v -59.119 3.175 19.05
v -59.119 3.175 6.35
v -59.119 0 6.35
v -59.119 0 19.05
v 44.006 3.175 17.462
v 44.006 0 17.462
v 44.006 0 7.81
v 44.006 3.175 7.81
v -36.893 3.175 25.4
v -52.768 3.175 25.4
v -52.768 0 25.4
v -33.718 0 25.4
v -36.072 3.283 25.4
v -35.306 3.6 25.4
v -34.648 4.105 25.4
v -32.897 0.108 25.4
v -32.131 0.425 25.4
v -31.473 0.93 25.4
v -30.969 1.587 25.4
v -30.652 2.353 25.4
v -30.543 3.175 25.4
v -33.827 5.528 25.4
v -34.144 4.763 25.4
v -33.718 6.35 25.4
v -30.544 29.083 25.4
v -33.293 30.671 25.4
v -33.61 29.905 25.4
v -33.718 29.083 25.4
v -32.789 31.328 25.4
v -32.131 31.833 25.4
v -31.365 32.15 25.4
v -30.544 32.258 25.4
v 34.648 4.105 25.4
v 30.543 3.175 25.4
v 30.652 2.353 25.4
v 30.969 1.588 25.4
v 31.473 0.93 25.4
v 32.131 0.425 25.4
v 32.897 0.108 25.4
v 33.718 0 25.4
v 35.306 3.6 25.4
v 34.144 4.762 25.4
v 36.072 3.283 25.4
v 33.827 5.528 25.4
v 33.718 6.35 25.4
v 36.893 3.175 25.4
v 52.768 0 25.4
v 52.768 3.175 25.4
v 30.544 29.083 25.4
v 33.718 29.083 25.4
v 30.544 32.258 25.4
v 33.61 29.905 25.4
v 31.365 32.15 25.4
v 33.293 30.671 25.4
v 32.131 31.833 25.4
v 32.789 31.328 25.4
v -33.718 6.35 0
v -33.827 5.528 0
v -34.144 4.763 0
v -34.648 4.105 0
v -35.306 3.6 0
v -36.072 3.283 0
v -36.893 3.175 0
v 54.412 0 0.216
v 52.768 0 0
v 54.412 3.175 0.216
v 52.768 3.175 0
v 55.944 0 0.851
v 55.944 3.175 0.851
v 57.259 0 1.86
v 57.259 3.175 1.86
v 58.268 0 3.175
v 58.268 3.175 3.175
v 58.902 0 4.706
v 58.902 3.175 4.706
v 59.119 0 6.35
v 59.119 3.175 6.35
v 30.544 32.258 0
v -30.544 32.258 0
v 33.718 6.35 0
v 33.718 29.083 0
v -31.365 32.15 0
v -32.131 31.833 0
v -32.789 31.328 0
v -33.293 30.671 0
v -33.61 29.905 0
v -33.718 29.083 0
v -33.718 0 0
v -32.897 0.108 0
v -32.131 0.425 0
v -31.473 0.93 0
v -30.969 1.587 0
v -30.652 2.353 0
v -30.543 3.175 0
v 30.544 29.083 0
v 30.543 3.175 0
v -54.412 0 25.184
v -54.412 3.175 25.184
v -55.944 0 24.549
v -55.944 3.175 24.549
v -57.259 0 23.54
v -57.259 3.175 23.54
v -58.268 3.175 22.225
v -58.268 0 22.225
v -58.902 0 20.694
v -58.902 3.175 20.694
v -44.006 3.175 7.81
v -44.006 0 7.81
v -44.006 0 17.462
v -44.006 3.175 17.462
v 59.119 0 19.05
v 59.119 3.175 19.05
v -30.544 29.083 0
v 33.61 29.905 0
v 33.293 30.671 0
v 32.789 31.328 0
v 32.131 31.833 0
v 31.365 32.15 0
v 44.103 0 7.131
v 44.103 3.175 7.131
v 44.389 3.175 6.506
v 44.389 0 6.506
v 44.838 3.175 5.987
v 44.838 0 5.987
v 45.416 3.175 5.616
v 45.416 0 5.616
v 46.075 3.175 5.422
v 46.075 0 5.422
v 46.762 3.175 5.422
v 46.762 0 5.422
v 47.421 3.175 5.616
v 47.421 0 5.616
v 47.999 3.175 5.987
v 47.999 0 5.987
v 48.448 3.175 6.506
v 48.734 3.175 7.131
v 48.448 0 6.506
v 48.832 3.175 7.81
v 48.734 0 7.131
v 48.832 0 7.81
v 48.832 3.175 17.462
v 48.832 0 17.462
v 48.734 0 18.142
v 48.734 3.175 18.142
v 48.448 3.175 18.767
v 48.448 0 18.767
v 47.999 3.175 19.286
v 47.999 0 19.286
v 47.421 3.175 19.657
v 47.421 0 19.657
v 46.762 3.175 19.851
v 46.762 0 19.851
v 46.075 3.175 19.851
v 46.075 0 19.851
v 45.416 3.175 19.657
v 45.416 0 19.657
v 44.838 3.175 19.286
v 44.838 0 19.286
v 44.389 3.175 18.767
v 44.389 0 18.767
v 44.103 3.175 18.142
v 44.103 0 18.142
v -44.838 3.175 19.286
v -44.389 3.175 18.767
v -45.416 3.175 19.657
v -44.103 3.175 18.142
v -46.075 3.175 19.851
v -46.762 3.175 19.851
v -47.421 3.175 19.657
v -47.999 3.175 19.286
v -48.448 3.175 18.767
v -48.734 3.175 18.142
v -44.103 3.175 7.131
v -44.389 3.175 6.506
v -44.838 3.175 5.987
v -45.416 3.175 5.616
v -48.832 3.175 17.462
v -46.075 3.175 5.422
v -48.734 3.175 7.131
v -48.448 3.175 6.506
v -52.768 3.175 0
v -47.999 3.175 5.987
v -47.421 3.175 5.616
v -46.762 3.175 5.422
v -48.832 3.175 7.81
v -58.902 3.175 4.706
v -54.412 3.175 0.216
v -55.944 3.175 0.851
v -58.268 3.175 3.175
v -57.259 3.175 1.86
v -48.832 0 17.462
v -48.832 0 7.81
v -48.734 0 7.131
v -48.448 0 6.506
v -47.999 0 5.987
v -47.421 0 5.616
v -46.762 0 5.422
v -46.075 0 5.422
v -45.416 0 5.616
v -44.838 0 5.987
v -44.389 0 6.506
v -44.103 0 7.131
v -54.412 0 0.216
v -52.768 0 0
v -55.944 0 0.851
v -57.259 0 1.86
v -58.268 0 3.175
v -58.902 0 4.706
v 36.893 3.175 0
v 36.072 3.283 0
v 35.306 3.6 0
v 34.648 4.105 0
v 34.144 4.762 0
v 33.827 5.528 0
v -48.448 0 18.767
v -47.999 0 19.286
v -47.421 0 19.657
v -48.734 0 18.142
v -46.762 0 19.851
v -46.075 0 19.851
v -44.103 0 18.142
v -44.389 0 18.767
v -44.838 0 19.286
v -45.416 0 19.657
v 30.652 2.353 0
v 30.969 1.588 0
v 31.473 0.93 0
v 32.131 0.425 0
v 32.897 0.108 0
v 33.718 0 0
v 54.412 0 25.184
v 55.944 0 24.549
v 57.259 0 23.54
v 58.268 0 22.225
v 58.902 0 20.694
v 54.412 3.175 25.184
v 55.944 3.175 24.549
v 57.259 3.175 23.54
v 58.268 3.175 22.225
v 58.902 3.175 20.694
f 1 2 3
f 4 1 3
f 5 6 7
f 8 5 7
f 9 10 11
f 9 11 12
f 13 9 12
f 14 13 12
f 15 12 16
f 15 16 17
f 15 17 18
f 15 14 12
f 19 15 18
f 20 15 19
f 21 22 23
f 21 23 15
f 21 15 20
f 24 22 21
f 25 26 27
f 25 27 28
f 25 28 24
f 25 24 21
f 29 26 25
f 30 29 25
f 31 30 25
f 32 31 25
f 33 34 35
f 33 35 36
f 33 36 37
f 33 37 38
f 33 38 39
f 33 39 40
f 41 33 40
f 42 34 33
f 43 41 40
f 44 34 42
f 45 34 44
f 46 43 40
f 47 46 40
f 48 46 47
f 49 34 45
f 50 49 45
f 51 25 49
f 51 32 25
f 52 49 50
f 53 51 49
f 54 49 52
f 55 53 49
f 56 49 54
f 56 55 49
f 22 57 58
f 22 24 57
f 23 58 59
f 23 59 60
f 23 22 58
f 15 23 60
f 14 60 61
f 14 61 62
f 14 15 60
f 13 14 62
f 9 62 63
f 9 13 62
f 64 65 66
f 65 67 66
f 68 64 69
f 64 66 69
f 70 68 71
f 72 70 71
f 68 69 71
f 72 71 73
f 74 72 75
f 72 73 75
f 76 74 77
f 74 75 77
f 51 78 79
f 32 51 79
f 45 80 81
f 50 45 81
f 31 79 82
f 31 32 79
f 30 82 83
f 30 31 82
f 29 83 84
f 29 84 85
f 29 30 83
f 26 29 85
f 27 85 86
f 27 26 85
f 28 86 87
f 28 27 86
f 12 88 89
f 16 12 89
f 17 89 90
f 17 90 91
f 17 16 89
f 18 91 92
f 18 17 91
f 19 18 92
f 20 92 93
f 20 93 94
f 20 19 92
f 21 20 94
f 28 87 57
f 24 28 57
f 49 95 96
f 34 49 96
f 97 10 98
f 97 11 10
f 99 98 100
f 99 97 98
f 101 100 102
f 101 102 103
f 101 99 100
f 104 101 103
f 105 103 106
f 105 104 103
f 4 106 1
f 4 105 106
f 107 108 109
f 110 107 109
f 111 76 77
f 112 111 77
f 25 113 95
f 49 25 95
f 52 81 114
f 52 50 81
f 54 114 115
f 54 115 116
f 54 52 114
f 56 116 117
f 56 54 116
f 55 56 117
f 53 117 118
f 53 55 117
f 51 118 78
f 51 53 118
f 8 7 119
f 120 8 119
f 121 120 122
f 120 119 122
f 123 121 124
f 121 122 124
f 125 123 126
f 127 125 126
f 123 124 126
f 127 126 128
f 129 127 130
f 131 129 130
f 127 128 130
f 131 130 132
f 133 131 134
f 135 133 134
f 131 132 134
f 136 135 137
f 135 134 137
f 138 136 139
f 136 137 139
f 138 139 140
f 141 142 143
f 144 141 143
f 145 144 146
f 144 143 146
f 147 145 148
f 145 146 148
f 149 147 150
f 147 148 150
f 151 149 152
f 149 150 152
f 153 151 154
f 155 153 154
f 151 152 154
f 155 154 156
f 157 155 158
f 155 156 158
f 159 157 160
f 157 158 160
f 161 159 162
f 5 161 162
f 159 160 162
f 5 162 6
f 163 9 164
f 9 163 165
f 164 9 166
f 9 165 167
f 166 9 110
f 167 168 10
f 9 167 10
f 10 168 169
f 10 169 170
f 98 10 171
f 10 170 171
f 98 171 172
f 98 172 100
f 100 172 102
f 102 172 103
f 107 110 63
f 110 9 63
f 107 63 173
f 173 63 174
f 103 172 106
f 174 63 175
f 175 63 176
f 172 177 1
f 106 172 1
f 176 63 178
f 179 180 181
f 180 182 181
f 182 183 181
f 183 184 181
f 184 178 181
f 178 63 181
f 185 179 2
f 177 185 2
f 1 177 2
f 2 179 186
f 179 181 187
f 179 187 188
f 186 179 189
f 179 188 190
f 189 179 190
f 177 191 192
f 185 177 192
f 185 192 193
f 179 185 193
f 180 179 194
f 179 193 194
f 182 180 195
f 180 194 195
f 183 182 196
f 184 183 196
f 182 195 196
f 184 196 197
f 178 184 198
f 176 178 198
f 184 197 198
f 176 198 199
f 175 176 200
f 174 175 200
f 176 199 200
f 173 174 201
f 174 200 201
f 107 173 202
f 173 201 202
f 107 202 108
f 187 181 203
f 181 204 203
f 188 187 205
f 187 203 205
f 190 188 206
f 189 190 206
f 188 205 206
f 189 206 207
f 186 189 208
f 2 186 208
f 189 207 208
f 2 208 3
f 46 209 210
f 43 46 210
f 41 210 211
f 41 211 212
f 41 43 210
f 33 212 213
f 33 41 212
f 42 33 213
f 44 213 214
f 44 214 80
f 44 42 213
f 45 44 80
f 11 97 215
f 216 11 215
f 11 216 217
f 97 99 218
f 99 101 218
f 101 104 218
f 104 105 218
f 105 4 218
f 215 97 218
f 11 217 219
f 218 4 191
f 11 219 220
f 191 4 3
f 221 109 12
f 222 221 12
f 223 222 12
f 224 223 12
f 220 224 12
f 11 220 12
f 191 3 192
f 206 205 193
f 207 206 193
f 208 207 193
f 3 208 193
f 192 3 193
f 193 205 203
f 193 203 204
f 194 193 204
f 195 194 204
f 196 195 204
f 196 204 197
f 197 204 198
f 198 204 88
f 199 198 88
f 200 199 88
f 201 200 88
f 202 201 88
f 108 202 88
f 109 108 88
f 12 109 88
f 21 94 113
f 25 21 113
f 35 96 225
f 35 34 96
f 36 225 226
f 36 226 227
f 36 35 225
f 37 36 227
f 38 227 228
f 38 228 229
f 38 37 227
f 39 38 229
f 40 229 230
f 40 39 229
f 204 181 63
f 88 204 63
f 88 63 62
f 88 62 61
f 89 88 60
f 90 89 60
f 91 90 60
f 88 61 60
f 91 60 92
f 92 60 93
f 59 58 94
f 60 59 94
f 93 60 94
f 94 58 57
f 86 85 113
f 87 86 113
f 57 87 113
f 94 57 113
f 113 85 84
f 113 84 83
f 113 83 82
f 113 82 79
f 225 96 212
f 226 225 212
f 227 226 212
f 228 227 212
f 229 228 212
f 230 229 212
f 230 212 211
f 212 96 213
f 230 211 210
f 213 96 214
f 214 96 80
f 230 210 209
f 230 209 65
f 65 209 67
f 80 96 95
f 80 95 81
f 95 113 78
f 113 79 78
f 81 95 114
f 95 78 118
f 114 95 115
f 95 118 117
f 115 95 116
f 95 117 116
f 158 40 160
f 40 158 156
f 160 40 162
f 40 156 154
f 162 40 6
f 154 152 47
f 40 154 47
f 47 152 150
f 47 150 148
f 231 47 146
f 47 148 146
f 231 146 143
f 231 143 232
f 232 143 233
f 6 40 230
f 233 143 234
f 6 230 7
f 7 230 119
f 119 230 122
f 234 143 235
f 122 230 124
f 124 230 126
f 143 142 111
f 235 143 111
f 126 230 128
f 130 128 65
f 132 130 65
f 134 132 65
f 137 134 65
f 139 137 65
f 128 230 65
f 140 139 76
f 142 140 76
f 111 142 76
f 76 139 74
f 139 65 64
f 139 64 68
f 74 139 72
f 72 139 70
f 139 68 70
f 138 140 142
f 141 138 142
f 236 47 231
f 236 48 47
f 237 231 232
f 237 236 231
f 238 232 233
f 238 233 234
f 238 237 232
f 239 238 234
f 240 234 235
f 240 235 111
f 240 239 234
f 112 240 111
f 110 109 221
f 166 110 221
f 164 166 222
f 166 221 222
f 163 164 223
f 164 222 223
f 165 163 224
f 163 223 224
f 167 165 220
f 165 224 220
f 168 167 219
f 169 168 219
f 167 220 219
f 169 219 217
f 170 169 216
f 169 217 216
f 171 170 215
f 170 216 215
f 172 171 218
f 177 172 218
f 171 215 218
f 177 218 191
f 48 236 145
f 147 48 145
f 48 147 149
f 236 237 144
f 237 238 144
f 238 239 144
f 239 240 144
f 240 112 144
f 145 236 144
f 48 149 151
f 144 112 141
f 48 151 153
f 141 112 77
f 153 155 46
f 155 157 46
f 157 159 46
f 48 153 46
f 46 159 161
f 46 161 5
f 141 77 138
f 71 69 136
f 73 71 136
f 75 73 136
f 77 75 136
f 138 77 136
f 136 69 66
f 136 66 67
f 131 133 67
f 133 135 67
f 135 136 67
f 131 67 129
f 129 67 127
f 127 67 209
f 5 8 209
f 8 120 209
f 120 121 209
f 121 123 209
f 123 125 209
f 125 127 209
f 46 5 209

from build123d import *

# Parameters (mm, degrees)
F1_DEPTH = 25.4
F2_R     = 3.175
F4_DEPTH = 32.259
F5_R     = 6.35
F6_R     = 3.175


with BuildPart() as f1:
    # F0 (on Top) → F1 (new body)
    with BuildSketch(Plane.XY):
        Polygon((-30.5435, 29.083), (0, 29.083), (30.5435, 29.083), (30.5435, 0), (59.1185, 0), (59.1185, 3.175), (33.7185, 3.175), (33.7185, 32.258), (0, 32.258), (-33.7185, 32.258), (-33.7185, 3.175), (-59.1185, 3.175), (-59.1185, 0), (-30.5435, 0), align=None)
    extrude(amount=F1_DEPTH)

    # F2
    f2_edges = [f1.edges().sort_by_distance(p)[0] for p in [
        (-30.5435, 0, 12.7),
        (30.5435, 0, 12.7),
    ]]
    fillet(f2_edges, radius=F2_R)

    # F3 (on Front) → F4 (cut, through all)
    with BuildSketch(Plane.XZ):
        with BuildLine():
            ThreePointArc((-48.8315, 7.8105), (-46.4185, 5.3975), (-44.0055, 7.8105))
            Line((-44.0055, 7.8105), (-44.0055, 17.4625))
            ThreePointArc((-44.0055, 17.4625), (-46.4185, 19.8755), (-48.8315, 17.4625))
            Line((-48.8315, 17.4625), (-48.8315, 7.8105))
        make_face()
        with BuildLine():
            Line((44.0055, 17.4625), (44.0055, 7.8105))
            ThreePointArc((44.0055, 7.8105), (46.4185, 5.3975), (48.8315, 7.8105))
            Line((48.8315, 7.8105), (48.8315, 17.4625))
            ThreePointArc((48.8315, 17.4625), (46.4185, 19.8755), (44.0055, 17.4625))
        make_face()
    extrude(amount=-F4_DEPTH, mode=Mode.SUBTRACT)

    # F5
    f5_edges = [f1.edges().sort_by_distance(p)[0] for p in [
        (-59.1185, 1.5875, 0),
        (-59.1185, 1.5875, 25.4),
        (59.1185, 1.5875, 25.4),
        (59.1185, 1.5875, 0),
    ]]
    fillet(f5_edges, radius=F5_R)

    # F6
    f6_edges = [f1.edges().sort_by_distance(p)[0] for p in [
        (-33.7185, 3.175, 12.7),
        (-33.7185, 32.258, 12.7),
        (33.7185, 32.258, 12.7),
        (33.7185, 3.175, 12.7),
    ]]
    fillet(f6_edges, radius=F6_R)


solid = f1.part
